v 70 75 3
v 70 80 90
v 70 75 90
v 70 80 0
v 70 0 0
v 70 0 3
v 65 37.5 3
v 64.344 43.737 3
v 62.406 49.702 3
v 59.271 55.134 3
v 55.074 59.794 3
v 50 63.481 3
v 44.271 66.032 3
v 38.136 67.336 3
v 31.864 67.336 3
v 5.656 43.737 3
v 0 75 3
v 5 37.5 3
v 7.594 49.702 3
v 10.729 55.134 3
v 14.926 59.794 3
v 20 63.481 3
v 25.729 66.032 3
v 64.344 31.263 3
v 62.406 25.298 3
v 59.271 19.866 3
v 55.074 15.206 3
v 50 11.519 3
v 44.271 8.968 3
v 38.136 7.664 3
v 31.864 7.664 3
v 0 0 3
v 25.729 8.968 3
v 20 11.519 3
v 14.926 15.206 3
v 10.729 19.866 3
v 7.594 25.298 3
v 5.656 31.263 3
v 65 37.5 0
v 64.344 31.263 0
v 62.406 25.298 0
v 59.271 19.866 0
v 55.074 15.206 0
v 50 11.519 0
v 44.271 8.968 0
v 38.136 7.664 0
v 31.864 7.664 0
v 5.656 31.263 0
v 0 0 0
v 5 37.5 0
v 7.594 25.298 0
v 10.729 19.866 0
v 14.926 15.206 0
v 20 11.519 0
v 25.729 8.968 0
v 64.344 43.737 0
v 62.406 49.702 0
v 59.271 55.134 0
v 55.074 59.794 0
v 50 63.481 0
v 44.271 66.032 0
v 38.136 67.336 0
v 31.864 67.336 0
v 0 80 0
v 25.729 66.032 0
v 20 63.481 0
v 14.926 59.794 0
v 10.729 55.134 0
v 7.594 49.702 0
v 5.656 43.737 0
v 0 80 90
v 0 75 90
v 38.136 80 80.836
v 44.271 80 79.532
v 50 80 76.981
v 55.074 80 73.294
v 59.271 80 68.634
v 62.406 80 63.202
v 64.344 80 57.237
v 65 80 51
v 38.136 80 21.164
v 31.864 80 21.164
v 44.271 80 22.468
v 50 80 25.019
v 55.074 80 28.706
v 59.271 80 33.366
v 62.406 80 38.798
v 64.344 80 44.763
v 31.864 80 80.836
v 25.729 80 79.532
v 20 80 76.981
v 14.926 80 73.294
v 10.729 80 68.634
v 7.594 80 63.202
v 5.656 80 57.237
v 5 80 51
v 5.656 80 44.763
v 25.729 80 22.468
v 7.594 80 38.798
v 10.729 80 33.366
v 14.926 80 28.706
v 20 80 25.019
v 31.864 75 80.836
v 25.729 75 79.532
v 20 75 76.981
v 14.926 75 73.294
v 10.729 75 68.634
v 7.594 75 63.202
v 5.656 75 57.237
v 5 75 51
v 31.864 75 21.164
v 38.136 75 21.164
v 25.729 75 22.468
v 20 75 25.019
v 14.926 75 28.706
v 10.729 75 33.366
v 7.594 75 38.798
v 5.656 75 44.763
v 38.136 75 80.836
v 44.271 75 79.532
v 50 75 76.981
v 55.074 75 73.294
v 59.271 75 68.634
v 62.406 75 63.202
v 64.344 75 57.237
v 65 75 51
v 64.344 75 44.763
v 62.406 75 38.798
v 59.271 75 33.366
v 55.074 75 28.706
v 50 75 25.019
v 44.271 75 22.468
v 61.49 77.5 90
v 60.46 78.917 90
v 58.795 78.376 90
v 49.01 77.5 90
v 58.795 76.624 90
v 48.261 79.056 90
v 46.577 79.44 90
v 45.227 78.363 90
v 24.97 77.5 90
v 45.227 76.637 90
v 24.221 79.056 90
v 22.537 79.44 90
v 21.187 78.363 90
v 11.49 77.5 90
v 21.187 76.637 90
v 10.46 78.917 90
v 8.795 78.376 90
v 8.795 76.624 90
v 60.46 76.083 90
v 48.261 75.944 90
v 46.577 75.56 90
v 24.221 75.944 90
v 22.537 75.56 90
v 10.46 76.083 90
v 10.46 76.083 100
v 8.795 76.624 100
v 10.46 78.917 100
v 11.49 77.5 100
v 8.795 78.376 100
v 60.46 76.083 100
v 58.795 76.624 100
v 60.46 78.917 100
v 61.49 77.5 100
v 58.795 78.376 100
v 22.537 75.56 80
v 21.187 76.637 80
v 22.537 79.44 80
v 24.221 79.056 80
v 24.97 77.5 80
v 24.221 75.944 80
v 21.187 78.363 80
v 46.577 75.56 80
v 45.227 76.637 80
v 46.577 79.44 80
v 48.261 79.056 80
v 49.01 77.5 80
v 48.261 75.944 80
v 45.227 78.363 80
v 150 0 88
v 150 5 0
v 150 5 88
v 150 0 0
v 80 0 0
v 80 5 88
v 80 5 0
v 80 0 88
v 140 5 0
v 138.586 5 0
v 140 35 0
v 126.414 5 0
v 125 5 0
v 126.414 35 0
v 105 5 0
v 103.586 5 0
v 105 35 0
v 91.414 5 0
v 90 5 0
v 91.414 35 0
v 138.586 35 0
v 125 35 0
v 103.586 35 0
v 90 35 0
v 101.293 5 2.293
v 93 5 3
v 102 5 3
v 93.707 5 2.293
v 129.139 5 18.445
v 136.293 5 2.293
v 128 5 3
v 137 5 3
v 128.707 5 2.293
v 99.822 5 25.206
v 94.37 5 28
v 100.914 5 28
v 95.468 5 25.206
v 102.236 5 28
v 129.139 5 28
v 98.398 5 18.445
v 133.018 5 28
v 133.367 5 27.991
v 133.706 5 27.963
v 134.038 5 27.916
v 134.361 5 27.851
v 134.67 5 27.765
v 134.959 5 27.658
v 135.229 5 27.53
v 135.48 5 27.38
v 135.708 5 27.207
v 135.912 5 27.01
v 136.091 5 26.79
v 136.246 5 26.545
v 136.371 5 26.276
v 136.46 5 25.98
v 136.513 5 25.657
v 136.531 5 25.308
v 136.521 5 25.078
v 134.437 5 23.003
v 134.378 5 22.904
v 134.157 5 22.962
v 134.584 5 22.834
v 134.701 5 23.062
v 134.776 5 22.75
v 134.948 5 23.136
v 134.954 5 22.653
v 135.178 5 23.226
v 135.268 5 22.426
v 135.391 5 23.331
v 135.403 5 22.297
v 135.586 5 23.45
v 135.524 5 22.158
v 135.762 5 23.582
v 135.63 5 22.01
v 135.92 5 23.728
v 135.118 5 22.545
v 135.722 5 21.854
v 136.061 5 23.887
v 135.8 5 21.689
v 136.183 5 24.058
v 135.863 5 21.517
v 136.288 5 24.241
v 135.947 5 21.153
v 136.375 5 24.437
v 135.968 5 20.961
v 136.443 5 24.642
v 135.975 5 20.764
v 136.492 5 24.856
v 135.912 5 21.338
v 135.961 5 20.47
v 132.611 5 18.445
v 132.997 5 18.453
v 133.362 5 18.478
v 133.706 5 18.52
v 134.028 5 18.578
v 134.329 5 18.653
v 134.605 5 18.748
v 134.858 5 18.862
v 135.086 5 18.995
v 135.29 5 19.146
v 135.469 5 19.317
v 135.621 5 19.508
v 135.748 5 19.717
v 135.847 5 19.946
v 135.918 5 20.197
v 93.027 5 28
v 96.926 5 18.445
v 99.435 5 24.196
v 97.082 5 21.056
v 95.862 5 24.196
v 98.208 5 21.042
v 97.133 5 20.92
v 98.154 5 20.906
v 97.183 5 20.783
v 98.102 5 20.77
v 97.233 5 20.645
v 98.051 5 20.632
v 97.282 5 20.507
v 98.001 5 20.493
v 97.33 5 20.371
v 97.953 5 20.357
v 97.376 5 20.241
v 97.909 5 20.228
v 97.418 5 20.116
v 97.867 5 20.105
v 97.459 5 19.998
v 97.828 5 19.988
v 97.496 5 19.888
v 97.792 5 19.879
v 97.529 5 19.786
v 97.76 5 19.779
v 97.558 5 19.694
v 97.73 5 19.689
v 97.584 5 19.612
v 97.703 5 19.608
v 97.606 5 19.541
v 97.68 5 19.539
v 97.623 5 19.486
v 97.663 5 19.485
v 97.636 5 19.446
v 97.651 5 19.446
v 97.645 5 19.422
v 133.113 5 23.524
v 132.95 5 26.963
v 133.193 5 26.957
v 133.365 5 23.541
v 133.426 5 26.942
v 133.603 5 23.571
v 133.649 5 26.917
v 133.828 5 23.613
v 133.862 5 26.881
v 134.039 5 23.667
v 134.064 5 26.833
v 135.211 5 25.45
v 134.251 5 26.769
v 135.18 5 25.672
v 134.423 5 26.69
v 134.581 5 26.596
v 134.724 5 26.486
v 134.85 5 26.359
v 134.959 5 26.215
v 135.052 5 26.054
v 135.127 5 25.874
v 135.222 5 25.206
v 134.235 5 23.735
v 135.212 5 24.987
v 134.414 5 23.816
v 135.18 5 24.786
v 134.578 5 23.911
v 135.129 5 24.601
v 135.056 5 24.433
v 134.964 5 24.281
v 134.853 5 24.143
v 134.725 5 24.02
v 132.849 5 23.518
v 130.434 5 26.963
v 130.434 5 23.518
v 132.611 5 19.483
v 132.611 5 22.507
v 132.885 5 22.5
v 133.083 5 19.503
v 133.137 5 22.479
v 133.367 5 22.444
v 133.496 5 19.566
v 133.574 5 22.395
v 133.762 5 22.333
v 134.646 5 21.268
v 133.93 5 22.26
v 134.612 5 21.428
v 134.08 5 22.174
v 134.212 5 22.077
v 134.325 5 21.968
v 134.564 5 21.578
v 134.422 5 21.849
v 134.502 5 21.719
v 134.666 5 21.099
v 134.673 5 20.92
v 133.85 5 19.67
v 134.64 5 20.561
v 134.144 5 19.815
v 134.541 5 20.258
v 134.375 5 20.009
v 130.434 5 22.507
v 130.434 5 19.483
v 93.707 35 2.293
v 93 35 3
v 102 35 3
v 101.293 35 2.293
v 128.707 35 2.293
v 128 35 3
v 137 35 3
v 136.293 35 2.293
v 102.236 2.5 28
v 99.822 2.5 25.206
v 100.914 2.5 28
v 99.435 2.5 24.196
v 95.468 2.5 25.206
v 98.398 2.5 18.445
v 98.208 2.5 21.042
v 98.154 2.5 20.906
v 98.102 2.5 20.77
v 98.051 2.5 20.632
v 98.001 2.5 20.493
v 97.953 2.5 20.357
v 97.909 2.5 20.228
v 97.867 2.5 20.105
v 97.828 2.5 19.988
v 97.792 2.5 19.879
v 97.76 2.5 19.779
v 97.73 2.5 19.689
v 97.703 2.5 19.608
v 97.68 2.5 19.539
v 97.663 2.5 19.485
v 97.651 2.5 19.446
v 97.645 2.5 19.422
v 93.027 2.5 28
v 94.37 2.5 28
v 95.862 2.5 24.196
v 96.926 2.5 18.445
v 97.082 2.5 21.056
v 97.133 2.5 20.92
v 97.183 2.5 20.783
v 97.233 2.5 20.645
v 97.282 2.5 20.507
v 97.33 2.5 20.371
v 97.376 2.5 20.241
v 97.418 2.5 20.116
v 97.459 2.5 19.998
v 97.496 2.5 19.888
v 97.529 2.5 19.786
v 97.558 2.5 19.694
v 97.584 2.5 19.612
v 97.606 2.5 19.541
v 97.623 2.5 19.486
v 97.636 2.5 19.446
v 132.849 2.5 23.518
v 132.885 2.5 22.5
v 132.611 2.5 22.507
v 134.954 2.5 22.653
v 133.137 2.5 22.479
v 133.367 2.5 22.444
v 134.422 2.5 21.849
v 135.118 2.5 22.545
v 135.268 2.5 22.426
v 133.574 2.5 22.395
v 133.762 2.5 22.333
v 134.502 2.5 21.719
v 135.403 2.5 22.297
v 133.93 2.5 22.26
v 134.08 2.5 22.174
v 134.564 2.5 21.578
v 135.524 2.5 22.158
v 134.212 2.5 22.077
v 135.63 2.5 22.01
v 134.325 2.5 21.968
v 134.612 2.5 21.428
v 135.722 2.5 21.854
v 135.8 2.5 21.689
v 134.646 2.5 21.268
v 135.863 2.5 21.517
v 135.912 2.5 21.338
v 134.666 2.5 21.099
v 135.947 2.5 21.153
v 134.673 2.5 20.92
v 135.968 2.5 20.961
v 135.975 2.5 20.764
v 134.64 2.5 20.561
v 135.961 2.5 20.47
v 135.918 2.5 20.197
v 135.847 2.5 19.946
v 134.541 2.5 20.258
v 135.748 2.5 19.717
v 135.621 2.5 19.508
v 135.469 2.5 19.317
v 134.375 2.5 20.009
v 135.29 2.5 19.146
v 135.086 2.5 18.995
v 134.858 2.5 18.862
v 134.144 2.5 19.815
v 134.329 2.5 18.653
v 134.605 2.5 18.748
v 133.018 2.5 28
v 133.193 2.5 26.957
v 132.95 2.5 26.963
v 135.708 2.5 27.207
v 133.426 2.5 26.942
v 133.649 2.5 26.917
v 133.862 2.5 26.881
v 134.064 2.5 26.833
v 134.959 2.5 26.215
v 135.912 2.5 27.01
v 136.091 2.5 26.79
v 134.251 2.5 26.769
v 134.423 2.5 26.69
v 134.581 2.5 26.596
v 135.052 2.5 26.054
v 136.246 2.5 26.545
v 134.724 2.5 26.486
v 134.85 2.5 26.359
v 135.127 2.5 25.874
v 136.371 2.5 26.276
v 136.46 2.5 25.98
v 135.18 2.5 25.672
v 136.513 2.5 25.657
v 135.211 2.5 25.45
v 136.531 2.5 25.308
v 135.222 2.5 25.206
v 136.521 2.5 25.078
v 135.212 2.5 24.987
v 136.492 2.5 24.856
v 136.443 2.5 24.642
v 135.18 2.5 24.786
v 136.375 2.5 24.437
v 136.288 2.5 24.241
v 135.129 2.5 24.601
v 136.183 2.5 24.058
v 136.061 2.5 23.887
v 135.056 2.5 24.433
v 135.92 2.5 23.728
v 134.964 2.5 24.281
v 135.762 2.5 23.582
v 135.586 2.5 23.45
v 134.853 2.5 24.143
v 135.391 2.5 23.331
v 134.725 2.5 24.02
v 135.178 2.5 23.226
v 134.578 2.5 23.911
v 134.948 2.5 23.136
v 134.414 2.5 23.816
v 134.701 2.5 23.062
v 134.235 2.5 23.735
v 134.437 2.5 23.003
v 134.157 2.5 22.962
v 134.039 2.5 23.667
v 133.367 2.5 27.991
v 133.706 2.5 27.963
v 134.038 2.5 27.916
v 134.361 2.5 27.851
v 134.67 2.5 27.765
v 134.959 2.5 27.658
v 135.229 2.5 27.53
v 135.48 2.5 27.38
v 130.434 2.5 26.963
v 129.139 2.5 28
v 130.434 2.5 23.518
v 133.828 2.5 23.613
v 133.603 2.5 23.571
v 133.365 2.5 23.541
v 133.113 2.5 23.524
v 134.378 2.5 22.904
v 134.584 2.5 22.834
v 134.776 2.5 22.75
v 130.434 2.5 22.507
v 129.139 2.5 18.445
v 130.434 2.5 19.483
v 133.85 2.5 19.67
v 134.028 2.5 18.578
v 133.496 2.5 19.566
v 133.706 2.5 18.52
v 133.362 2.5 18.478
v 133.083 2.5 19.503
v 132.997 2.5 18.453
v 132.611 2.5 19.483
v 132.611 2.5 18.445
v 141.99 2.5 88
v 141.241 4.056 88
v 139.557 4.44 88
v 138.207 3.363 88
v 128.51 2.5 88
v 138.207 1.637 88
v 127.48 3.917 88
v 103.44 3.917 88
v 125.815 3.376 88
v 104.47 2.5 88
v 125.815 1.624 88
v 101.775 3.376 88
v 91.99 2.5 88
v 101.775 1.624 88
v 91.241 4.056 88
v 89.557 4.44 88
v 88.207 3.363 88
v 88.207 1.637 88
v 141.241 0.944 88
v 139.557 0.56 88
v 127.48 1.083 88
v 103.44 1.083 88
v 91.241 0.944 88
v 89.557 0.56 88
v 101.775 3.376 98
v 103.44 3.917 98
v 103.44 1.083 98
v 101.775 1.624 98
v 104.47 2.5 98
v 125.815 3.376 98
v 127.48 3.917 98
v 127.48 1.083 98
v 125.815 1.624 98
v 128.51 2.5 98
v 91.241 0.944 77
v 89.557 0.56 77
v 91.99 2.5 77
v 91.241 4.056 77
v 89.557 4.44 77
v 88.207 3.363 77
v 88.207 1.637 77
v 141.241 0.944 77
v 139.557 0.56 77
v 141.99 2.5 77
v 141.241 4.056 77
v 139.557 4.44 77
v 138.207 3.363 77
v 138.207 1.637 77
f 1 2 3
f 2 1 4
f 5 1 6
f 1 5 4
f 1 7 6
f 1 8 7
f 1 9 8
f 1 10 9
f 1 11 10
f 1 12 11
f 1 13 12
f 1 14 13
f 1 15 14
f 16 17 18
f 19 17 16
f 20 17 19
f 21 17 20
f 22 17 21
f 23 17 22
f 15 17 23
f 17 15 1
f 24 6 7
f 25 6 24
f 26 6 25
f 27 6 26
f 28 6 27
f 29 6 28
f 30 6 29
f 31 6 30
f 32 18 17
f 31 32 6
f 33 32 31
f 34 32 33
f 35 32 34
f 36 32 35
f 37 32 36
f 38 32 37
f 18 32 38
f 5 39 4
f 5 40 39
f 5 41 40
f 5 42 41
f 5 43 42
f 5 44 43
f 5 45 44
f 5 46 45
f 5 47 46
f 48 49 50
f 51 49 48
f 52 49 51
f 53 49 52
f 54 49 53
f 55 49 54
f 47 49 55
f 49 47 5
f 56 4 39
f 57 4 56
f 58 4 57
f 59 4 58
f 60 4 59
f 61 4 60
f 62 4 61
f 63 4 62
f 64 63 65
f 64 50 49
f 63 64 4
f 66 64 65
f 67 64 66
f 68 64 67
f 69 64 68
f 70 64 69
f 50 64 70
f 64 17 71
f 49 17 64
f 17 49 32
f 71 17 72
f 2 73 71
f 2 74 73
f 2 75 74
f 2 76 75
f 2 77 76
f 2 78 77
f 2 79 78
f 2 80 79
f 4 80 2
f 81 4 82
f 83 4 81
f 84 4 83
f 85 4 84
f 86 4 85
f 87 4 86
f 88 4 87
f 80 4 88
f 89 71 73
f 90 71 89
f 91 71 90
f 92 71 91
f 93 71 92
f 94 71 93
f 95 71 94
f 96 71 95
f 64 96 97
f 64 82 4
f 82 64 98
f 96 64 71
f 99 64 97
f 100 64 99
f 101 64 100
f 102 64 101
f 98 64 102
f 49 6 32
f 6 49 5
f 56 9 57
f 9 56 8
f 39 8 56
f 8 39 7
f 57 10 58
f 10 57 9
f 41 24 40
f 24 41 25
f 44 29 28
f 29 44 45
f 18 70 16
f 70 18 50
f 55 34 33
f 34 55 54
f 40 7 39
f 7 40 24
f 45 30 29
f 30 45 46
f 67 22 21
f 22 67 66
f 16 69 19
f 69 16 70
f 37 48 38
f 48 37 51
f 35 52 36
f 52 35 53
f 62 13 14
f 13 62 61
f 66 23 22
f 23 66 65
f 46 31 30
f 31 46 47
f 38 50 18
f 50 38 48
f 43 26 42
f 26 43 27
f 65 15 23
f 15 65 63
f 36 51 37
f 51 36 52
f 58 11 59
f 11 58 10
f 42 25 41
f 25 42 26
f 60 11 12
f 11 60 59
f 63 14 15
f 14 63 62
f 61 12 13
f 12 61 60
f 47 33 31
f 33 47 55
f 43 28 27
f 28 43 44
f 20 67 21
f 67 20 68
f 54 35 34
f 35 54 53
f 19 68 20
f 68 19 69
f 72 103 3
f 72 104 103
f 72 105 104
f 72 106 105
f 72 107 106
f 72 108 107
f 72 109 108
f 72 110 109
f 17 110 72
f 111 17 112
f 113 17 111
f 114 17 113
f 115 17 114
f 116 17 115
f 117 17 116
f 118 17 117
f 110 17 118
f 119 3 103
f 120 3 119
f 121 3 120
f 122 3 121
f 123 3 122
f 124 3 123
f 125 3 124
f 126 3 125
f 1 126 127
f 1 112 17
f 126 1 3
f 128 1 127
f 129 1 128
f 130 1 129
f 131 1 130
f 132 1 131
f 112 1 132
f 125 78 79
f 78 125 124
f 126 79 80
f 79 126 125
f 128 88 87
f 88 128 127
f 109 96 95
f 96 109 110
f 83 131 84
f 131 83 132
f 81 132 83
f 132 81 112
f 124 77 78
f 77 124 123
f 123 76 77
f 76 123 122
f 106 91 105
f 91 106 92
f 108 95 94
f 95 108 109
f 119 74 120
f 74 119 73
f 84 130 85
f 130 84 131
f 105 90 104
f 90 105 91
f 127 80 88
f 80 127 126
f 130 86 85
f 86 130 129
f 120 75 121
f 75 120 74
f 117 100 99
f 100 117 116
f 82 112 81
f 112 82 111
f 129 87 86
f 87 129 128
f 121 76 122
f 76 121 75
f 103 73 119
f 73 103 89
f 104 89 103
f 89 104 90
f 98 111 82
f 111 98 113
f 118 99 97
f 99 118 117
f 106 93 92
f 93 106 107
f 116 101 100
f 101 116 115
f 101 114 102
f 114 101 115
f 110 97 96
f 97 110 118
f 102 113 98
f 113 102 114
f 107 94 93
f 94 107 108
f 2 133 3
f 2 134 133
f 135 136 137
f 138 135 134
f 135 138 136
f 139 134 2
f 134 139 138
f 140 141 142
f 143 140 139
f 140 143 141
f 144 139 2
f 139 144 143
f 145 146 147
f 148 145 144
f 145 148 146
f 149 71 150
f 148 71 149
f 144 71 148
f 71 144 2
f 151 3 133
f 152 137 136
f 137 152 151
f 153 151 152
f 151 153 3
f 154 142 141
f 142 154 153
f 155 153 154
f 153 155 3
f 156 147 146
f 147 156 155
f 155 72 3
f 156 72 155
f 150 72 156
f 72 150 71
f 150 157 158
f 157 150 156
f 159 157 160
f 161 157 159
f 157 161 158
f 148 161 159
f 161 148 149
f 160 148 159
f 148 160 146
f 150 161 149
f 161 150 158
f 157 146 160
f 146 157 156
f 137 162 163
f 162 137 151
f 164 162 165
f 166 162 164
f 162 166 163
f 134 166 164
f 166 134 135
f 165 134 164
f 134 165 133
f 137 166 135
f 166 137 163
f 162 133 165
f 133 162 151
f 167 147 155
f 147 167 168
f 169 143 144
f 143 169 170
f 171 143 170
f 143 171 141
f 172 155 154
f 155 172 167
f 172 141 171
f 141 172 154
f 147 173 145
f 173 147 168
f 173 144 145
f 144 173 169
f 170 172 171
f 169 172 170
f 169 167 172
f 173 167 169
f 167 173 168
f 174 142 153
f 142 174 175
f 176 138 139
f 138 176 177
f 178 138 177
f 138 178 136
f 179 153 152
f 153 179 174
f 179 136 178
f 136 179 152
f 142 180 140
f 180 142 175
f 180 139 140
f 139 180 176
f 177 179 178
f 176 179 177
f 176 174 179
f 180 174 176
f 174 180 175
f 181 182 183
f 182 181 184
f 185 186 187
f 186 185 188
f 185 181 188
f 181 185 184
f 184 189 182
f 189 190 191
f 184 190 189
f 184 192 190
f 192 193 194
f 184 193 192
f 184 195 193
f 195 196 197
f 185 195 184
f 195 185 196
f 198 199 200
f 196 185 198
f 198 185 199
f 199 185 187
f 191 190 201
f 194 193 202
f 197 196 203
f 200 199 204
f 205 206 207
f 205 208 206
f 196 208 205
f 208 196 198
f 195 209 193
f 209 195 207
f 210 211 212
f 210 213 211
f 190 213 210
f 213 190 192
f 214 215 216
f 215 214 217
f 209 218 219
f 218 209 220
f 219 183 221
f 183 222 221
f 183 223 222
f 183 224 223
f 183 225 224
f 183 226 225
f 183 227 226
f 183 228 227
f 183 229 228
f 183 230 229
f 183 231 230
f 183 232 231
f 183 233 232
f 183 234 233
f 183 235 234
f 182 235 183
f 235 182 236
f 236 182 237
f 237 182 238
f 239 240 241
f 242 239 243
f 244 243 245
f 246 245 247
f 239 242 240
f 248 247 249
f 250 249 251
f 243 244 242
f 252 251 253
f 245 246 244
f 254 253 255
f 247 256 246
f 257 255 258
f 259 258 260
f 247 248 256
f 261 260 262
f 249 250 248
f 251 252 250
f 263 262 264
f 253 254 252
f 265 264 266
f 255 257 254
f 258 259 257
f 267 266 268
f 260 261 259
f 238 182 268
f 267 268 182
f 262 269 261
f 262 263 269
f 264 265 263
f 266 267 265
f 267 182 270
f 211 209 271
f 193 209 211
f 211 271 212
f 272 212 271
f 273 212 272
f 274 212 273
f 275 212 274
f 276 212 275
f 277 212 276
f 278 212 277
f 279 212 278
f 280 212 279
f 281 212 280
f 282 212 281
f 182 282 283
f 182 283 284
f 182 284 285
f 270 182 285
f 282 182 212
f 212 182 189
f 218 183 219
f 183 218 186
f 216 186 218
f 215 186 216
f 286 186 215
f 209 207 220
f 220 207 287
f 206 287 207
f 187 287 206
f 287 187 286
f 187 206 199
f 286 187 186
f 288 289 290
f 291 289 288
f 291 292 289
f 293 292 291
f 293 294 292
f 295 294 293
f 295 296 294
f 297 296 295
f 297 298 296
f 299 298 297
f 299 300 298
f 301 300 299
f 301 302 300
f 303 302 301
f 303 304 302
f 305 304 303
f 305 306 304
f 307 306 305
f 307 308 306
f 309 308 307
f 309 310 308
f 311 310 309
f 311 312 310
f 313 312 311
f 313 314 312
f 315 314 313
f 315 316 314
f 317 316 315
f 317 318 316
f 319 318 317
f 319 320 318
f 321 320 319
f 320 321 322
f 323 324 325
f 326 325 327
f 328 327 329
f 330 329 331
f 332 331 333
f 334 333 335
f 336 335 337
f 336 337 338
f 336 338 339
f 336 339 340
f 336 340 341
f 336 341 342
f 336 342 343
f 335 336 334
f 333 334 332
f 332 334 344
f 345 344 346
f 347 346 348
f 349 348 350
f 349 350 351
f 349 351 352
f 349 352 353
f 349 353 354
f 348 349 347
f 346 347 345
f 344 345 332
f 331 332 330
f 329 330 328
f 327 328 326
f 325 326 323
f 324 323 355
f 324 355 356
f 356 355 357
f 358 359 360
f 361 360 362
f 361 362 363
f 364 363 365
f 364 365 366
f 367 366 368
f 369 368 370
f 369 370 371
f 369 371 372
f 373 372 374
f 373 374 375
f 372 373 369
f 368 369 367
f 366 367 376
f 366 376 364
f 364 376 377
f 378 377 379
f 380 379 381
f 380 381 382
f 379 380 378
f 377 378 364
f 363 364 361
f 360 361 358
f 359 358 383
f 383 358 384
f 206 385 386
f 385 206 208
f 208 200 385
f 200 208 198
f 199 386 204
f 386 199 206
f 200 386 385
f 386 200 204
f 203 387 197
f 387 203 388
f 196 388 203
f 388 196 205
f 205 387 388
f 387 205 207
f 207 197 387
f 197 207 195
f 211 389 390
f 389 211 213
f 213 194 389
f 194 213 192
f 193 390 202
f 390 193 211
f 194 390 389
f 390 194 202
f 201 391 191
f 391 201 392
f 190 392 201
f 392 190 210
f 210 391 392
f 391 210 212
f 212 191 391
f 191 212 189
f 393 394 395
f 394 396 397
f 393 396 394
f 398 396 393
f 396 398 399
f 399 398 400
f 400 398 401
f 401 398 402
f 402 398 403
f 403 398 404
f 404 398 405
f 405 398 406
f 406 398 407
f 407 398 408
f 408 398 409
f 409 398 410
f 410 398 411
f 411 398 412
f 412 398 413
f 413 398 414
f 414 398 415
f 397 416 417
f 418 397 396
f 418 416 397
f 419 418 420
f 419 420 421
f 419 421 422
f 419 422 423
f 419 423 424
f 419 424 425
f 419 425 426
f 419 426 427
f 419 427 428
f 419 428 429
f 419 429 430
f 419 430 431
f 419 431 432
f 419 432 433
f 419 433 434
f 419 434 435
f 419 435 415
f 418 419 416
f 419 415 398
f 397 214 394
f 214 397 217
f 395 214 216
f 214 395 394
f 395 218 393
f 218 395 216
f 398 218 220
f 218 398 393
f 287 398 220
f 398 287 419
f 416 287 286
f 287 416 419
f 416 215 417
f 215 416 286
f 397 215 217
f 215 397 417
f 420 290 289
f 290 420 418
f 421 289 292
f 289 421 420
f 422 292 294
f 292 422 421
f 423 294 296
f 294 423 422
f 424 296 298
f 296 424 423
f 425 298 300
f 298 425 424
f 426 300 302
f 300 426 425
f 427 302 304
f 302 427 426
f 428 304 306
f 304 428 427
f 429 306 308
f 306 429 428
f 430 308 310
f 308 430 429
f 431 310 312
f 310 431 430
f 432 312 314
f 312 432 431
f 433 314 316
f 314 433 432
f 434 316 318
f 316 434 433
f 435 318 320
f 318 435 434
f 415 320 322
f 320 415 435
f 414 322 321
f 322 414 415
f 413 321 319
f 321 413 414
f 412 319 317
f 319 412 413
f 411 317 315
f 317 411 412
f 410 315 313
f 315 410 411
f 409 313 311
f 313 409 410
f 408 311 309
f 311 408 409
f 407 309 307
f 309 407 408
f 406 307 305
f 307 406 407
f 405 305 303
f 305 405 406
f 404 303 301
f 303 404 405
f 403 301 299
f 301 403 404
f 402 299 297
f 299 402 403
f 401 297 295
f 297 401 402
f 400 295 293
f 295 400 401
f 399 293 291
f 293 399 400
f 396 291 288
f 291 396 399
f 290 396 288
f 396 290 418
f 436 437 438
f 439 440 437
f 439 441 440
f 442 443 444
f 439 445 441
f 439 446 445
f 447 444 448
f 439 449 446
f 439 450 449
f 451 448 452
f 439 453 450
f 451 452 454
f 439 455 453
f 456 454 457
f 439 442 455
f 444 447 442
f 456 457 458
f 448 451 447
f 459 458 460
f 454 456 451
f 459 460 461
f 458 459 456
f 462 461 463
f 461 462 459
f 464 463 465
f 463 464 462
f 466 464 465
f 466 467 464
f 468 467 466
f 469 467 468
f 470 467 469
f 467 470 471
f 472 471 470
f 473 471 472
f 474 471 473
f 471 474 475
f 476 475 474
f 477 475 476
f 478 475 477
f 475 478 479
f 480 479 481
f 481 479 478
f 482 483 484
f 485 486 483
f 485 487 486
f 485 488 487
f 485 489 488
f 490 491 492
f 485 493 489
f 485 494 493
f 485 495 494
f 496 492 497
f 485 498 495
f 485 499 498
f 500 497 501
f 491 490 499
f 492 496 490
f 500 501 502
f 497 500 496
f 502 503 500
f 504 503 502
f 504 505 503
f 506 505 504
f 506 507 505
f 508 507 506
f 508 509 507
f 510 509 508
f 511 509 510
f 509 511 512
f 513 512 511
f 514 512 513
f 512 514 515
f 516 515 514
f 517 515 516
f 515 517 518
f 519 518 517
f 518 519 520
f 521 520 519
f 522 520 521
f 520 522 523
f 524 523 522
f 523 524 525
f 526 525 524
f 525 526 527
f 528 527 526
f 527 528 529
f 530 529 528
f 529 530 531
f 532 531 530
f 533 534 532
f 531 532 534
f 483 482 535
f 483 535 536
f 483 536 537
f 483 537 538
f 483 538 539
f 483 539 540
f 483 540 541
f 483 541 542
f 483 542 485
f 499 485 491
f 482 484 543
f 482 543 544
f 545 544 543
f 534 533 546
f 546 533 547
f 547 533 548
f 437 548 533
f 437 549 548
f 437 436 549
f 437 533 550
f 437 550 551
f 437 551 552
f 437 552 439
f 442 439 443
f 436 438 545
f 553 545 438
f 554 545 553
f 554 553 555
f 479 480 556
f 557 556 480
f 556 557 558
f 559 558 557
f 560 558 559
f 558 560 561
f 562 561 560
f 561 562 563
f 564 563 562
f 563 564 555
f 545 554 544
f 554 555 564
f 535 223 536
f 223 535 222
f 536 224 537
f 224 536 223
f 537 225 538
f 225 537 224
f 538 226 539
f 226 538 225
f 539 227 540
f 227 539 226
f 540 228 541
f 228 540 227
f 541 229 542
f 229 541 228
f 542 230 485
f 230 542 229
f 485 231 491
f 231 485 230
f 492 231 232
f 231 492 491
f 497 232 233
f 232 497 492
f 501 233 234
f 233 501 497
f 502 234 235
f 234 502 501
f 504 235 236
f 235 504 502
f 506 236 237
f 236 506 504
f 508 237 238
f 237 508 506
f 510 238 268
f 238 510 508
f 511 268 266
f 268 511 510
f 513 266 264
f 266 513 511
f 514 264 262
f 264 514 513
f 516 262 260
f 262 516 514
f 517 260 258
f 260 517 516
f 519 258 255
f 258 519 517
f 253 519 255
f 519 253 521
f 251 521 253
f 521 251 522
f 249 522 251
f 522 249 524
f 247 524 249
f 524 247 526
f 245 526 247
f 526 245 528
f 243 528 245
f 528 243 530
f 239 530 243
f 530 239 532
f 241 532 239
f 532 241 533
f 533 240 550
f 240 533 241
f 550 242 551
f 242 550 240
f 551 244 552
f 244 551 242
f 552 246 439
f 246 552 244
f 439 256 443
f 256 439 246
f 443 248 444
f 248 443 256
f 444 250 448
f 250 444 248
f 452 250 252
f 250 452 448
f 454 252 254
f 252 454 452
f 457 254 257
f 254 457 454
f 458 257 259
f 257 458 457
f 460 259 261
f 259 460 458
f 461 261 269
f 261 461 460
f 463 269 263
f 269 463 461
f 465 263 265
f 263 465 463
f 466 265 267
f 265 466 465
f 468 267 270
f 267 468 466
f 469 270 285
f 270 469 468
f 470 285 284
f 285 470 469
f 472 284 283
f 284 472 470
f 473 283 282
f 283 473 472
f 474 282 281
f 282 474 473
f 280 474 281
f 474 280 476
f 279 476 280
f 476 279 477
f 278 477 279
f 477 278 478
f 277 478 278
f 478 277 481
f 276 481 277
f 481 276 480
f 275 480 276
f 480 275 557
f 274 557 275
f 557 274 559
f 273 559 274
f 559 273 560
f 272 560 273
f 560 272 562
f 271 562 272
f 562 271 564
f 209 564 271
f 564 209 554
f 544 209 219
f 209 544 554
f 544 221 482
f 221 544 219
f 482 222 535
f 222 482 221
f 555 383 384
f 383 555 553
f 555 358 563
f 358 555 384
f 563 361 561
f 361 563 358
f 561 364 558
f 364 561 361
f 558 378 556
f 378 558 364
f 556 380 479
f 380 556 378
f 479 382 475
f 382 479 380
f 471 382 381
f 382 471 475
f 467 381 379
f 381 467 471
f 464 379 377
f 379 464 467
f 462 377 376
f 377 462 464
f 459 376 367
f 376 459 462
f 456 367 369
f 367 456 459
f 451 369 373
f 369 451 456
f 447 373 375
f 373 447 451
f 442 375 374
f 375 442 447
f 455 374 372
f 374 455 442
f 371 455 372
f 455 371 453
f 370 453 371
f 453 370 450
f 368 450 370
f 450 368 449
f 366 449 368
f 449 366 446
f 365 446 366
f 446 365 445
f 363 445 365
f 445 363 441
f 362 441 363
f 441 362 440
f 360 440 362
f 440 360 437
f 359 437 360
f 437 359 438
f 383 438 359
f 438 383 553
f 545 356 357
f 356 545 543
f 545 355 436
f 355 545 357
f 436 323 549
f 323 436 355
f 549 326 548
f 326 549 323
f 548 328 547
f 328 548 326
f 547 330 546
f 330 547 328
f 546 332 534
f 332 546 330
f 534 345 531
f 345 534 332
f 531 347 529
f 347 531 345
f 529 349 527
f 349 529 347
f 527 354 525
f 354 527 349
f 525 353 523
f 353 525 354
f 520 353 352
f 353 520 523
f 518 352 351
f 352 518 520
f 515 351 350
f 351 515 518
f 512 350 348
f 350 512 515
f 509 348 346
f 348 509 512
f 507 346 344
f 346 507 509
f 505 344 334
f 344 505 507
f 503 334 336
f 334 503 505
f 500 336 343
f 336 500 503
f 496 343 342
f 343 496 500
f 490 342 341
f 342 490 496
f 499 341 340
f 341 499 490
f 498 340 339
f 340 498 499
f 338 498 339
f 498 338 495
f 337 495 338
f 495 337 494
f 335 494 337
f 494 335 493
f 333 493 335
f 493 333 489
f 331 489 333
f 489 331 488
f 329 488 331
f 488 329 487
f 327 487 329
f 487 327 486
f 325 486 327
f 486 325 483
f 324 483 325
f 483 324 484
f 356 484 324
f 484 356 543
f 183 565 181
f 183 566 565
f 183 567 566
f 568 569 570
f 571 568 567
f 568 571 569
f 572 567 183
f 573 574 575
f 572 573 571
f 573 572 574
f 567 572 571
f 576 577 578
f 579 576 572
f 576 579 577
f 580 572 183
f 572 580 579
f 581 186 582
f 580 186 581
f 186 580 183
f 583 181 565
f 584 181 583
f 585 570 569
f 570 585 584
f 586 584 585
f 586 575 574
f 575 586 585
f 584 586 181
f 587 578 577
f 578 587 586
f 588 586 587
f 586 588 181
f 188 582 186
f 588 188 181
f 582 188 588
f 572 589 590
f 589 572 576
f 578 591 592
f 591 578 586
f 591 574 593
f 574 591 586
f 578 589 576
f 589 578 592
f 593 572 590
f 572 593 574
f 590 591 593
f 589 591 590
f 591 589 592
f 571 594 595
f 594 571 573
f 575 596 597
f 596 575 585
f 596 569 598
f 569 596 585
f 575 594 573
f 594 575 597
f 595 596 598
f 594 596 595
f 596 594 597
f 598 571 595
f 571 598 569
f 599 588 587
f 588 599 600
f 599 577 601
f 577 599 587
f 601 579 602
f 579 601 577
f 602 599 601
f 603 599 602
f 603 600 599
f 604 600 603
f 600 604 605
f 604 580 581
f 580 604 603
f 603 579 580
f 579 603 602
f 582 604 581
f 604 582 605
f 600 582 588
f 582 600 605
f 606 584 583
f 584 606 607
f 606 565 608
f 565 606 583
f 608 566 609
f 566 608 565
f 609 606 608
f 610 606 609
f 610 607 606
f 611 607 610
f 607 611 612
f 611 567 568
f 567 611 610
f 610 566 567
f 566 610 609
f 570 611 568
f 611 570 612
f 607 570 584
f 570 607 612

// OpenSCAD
// Number of toothbrushes to hod
number_of_toothbrushes = 2;
// Distance the from the outer holders to the side
holder_side_cushion = 10;
// Distance between toothbrush holders
holder_cushion = 20;
// For the holder itself, the outer distance apart (before narrowing)
holder_max_width = 15;
// For the holder itself, the inner distance apart
holder_min_width = 9;
// Depth of the protruding toothbrush holder
holder_depth = 30;
width = (number_of_toothbrushes * holder_max_width) + (2 * holder_side_cushion) +((number_of_toothbrushes - 1) * holder_cushion);
base_width = width;
// Depth of the base
base_depth = 80;
// Height of the base
base_height = 3;
// Just to make OpenSCAD happy.
fudge = 0.01;
// Min height of the stem of a toothbrush that goes in (neck to bottom)
toothbrush_stem_height = 175;
// Thickness of backing plate.
backplate_thickness = 5;
// Split this into two pieces, with rods and holes for connecting?
split = true;
// Length of rods that will connect the two pieces
split_rod_length = 10;
// Distance between rods that will connect the two pieces
split_rod_cushion = 10;
// Tolerance in radius of rods/holes
split_rod_radius_tolerance = .5;
// Tolerance in length of rods/holes
split_rod_length_tolerance = 1;
split_rod_radius = (backplate_thickness / 2) - (2 *split_rod_radius_tolerance) - fudge;
// Height to split into pieces
split_at = 90;
base_cutout_radius = (min(base_depth,base_width) / 2) - 5;
back_cutout_radius = (min(width,split_at) / 2) - 5;
// Should we make circular cutouts?
apply_cutouts = true;
// If we're splitting it, distance between the two pieces
distance_between = 10;
text_depth=backplate_thickness / 2;
// Initials to place below the holders
initials = ["A","B"];

module base(){
    difference(){
        cube([base_width,base_depth,base_height]);
        if (apply_cutouts){
            translate([base_width / 2,(base_depth - backplate_thickness) / 2,0]) cylinder(r=base_cutout_radius,h=base_height);
        }
    }
}

module back(){
    translate([0,base_depth - backplate_thickness,base_height]){
        difference(){
            cube([base_width,backplate_thickness,toothbrush_stem_height]);
            if (apply_cutouts){
                translate([width / 2,backplate_thickness+(fudge/2),base_height+back_cutout_radius+15]) rotate([90,0,0]) cylinder(r=back_cutout_radius,h=(backplate_thickness+fudge));
            }
        }
    }
}

module initials(){
    for (i = [0 : number_of_toothbrushes]){
        x_offset = holder_side_cushion+((holder_max_width / 2)-4.5) + (i * (holder_cushion + holder_max_width));
        translate([x_offset,(base_depth - backplate_thickness)+text_depth,150]) rotate([90,0,0]) linear_extrude(height=text_depth){
            text(initials[i]);
        }
    }
}


module holder(){
    travel = (holder_max_width - holder_min_width)/2;
    piece_length = travel / sin(45);
    rotate([0,45,0]){
        cube([piece_length,holder_depth,1]);
    }
    translate([travel + holder_min_width,0,-travel]){
        rotate([0,-45,0]){
            cube([piece_length,holder_depth,1]);
        }
    }
}

module holders() {
    translate([holder_side_cushion,base_depth - (backplate_thickness + holder_depth),base_height + toothbrush_stem_height]){
        for (i = [0:number_of_toothbrushes - 1]){
            translate([(holder_max_width + holder_cushion)*i,0,0]){
                holder();
            }
        }
    }
}

module splitRod(isHole) {
    if (isHole){
        cylinder(r=(split_rod_radius+split_rod_radius_tolerance),h=(split_rod_length+split_rod_length_tolerance));
    } else {
        cylinder(r=split_rod_radius,h=split_rod_length);
    }
}

module fullThing(){
    difference(){
        union() {
            base();
            back();
            holders();
        }
        initials();
    }
}

module bottomPart(){
    difference(){
        union(){
            intersection(){
                fullThing();
                cube([width,base_depth,split_at]);
            }
            translate([split_rod_cushion,base_depth - (backplate_thickness / 2),split_at]){
                splitRod(false);
            }
            translate([width - split_rod_cushion,base_depth - (backplate_thickness / 2),split_at]){
                splitRod(false);
            }
        }
        translate([(split_rod_cushion*2)+(split_rod_radius*2),base_depth - (backplate_thickness / 2),split_at-split_rod_length]){
            splitRod(true);
        }
        translate([width - ((split_rod_cushion*2)+(split_rod_radius*2)),base_depth - (backplate_thickness / 2),split_at-split_rod_length]){
            splitRod(true);
        }
    }
}

module topPart(){
    top_height = base_height + toothbrush_stem_height;
    rotate([180,0,0]) translate([width+distance_between,-base_depth,-top_height]) difference(){
        union(){
            intersection(){
                fullThing();
                translate([0,0,split_at]) cube([width,base_depth,top_height - split_at]);
            }
            translate([(split_rod_cushion*2)+(split_rod_radius*2),base_depth - (backplate_thickness / 2),split_at-split_rod_length]){
                splitRod(false);
            }
            translate([width - ((split_rod_cushion*2)+(split_rod_radius*2)),base_depth - (backplate_thickness / 2),split_at-split_rod_length]){
                splitRod(false);
            }
        }
        translate([split_rod_cushion,base_depth - (backplate_thickness / 2),split_at]){
            splitRod(true);
        }
        translate([width - split_rod_length,base_depth - (backplate_thickness / 2),split_at]){
            splitRod(true);
        }
    }
}

if (split){
    bottomPart();
    topPart();
} else {
    fullThing();
}
